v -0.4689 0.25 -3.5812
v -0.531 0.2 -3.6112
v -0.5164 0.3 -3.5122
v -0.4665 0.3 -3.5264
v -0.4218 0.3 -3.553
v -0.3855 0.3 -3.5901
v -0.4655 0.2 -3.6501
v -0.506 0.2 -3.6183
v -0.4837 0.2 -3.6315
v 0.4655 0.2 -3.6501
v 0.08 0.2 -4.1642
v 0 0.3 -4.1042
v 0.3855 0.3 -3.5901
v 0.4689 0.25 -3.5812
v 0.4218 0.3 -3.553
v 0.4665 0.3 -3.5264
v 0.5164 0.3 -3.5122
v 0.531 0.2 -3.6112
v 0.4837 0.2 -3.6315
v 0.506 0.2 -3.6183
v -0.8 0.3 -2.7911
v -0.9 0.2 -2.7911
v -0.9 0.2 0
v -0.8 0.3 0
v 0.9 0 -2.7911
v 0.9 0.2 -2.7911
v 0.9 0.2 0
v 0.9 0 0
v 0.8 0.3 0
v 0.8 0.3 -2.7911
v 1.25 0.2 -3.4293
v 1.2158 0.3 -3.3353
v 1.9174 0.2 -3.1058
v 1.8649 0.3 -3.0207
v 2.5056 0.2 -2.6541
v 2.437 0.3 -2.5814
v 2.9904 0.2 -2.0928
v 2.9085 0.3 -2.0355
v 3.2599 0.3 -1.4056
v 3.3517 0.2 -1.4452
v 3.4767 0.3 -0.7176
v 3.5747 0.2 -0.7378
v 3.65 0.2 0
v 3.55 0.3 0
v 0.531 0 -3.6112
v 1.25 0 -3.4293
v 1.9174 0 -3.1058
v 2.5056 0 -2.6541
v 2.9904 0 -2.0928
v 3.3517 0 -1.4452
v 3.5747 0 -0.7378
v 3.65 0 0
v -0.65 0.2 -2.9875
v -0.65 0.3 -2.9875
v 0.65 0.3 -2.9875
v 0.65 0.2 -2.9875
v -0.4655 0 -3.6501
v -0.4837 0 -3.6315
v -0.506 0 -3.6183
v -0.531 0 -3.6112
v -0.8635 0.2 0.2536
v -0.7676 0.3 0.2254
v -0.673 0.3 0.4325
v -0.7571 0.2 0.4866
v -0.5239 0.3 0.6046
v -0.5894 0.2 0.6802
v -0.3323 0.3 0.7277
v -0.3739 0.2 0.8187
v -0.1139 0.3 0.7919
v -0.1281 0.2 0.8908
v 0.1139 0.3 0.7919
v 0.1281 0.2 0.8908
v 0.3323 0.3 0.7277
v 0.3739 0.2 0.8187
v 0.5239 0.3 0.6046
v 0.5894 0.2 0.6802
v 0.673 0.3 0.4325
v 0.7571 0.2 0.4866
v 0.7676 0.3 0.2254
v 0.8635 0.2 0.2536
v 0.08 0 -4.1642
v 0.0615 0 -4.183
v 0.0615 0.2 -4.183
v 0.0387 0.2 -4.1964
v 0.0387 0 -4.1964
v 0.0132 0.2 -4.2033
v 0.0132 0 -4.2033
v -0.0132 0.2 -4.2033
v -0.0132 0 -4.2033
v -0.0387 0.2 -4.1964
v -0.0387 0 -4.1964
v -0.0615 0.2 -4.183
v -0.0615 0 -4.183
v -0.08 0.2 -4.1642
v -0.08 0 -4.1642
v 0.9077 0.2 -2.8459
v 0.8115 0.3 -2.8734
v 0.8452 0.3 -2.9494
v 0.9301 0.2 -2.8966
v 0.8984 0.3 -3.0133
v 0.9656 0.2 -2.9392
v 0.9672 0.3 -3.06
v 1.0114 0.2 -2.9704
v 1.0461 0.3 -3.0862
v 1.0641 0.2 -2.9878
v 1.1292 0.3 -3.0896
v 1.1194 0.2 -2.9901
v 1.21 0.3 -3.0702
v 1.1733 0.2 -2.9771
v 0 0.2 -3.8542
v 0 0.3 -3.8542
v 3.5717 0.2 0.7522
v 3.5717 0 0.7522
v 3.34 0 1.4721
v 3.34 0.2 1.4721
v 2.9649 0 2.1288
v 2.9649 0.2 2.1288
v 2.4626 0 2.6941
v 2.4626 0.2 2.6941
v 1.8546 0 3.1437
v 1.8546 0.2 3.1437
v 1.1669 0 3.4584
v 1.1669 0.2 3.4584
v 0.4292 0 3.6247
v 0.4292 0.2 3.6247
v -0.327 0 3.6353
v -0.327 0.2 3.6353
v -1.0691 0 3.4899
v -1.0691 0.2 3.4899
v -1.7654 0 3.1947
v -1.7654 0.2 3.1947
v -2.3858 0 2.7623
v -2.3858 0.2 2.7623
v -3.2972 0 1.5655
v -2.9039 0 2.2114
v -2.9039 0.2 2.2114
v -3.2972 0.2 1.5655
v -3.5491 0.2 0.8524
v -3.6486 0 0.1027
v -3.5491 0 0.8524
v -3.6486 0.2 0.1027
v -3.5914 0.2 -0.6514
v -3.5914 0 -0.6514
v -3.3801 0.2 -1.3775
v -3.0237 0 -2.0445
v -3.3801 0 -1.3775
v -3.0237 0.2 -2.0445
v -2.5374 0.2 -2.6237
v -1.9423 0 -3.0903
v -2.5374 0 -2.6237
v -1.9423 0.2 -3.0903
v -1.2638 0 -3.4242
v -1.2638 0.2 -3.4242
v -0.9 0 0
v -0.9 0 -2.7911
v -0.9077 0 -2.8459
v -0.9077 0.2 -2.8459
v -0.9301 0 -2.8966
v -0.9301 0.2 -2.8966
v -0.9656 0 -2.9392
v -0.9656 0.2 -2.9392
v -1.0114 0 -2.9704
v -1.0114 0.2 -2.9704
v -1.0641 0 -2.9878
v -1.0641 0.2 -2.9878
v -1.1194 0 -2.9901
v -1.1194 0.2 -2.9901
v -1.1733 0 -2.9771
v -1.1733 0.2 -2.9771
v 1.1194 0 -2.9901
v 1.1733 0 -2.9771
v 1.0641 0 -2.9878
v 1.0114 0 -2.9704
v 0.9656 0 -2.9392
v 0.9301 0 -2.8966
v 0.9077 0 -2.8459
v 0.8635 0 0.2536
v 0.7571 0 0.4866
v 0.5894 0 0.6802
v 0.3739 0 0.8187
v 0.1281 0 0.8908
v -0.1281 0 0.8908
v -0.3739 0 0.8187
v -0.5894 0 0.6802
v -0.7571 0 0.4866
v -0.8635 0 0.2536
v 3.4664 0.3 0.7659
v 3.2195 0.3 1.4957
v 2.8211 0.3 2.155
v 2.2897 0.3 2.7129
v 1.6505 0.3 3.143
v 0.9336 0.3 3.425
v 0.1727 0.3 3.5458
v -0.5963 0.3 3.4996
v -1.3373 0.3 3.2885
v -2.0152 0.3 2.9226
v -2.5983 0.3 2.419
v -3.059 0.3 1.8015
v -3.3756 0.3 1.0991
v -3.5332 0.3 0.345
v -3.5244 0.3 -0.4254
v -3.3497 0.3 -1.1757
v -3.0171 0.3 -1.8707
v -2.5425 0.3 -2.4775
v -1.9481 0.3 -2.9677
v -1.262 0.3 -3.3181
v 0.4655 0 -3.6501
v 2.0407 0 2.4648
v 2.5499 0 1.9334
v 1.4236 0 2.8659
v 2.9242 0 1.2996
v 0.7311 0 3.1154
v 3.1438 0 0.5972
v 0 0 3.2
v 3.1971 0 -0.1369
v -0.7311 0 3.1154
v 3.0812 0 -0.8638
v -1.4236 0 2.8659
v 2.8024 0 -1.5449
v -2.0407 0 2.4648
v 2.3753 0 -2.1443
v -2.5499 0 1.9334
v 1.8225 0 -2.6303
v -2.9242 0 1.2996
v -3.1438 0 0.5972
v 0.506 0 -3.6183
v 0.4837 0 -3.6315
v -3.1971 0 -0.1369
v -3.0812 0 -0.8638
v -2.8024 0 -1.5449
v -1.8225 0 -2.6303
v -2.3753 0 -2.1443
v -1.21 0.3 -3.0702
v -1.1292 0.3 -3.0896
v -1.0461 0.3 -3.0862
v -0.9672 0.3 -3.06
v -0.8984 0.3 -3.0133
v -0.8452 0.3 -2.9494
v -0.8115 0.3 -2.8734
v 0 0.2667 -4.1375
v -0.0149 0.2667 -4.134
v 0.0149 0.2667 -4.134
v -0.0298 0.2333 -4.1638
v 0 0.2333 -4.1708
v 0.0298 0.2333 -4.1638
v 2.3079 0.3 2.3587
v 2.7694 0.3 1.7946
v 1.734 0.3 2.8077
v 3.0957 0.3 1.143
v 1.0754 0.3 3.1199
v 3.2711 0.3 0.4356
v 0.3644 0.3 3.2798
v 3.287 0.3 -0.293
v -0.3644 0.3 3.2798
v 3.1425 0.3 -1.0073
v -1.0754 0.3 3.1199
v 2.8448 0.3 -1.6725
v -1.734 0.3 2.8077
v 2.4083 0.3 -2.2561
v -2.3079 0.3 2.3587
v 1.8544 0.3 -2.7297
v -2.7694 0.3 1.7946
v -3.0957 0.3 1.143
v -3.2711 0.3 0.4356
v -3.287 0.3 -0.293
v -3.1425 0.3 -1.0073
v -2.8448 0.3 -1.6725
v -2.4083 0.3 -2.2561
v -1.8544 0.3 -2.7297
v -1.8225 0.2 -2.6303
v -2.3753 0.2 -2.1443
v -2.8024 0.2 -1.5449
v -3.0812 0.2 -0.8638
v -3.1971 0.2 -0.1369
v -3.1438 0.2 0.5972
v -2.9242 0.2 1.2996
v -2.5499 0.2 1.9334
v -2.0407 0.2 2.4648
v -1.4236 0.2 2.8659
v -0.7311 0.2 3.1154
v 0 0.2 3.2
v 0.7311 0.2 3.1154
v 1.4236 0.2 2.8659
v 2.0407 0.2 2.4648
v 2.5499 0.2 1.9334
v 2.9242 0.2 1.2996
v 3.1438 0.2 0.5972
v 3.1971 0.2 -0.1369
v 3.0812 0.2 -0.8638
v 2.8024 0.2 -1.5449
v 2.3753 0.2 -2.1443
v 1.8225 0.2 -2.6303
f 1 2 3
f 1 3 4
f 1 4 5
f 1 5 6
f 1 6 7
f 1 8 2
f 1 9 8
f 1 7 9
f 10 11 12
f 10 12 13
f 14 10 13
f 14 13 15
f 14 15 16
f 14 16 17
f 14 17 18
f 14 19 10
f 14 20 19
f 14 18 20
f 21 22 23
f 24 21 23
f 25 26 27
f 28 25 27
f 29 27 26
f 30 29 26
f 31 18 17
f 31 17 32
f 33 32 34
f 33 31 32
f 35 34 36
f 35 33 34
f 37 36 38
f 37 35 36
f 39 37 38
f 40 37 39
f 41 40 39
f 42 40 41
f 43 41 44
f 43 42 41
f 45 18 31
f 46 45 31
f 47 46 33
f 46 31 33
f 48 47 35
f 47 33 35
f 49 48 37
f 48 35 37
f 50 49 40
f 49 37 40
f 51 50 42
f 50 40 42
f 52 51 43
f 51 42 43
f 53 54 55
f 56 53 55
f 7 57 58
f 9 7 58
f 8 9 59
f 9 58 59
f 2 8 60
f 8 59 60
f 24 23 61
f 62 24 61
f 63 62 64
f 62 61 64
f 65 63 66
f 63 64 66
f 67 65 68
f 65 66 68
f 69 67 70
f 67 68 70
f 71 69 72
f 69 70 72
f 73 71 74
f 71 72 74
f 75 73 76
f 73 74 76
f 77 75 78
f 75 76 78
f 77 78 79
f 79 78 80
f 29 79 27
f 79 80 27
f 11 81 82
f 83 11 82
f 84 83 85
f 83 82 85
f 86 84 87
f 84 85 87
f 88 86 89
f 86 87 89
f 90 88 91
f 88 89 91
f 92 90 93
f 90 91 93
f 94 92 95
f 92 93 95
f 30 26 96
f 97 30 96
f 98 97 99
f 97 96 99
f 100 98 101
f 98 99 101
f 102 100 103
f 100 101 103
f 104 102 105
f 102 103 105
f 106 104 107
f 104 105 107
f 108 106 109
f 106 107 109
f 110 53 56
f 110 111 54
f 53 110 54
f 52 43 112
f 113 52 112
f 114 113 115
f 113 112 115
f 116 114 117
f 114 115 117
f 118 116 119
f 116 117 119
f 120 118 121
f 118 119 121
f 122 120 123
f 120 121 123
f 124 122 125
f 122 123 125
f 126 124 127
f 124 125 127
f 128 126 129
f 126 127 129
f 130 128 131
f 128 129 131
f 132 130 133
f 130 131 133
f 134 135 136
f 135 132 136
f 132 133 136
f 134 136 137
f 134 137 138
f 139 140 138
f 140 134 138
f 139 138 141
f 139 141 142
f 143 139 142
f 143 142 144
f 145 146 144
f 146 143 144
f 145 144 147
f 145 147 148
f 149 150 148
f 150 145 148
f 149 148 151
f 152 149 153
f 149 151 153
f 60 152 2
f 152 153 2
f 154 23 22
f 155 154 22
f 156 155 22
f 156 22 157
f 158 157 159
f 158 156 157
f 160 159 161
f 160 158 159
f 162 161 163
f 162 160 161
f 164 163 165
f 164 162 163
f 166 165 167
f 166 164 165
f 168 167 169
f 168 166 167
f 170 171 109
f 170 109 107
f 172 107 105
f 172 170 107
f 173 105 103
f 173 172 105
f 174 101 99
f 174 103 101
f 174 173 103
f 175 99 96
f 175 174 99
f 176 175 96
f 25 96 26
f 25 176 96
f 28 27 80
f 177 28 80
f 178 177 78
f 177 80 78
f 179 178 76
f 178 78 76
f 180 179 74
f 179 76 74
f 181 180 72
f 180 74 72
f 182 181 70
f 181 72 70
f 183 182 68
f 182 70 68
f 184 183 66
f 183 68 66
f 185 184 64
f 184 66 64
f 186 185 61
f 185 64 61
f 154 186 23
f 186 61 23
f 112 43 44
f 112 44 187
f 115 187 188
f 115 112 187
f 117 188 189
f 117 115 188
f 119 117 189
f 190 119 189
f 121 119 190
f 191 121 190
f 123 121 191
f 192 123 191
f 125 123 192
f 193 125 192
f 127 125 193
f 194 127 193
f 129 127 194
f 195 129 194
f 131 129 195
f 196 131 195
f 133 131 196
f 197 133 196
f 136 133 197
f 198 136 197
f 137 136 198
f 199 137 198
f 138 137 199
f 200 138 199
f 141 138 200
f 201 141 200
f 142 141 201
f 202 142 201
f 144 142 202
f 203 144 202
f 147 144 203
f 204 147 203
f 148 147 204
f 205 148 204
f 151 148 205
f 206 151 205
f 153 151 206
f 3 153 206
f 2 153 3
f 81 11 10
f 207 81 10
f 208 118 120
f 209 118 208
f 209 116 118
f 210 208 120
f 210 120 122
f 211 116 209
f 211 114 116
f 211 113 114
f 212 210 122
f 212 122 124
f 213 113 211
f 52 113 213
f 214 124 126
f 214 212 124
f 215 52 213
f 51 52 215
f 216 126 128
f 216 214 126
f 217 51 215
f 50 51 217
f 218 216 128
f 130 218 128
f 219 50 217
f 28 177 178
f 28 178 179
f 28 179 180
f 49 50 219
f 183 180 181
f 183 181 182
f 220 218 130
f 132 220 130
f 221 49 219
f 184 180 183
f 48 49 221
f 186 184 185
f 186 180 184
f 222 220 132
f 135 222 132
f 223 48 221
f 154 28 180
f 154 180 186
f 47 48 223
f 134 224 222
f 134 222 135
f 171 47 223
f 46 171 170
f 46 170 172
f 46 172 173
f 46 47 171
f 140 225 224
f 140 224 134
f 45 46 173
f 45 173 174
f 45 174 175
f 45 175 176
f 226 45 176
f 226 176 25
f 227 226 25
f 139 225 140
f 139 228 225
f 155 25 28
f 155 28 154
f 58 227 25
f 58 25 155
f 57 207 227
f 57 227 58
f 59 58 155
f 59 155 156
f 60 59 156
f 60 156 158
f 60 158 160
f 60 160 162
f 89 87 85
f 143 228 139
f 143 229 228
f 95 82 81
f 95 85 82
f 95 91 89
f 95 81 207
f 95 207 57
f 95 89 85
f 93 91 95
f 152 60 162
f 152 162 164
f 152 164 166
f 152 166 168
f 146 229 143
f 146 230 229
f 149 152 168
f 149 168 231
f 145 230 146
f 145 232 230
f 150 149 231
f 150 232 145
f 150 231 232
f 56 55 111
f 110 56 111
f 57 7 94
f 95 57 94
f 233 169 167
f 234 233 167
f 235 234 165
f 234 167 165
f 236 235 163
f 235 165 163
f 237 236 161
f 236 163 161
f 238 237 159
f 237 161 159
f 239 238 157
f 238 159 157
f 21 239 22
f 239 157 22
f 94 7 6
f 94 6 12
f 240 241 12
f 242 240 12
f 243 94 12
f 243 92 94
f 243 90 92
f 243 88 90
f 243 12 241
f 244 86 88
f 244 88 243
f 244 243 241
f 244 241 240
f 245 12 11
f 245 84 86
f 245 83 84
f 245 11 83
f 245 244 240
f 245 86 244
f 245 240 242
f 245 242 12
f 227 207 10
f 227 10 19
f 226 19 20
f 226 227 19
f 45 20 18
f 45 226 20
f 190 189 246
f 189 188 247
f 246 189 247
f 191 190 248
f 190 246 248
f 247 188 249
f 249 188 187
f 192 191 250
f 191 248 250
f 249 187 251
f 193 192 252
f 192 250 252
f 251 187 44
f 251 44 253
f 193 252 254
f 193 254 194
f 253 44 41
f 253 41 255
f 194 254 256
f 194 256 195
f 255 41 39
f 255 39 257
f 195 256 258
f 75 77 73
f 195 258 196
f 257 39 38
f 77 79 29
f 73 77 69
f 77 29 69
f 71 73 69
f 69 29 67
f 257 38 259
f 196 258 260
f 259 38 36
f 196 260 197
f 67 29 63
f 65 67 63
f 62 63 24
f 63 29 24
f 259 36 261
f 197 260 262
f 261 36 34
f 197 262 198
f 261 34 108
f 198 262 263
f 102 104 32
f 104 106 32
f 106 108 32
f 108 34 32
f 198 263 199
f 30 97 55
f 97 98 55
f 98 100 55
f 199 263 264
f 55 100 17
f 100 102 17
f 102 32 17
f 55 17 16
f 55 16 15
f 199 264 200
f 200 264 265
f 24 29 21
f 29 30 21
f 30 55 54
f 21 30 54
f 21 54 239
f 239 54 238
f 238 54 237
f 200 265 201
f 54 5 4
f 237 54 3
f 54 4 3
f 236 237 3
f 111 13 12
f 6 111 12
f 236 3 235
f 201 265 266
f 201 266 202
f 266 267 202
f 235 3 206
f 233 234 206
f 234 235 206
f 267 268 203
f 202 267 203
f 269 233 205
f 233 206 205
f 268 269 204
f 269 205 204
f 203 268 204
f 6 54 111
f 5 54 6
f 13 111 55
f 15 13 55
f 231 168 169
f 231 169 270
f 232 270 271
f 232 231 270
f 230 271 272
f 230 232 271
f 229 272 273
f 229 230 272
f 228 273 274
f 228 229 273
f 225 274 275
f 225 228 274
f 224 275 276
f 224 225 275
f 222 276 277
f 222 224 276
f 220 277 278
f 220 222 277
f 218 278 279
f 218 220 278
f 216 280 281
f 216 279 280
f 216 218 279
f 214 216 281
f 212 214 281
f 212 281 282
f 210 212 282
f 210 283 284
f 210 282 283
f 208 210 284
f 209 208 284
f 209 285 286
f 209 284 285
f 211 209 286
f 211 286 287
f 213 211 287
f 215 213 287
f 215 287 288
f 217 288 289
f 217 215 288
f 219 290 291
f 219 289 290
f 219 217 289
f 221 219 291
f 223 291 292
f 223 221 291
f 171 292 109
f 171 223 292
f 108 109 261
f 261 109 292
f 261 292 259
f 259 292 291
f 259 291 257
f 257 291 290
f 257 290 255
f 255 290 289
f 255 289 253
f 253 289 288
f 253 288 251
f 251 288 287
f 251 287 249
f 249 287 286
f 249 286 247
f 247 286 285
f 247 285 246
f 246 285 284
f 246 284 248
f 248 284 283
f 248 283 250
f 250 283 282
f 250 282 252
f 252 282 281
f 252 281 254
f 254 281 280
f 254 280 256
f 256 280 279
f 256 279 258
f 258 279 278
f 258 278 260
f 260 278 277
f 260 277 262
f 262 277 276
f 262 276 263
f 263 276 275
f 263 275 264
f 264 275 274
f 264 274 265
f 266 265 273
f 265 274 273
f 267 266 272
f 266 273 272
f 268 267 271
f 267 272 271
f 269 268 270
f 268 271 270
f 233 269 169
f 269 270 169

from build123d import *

# Parameters (mm, degrees)
SKETCH2_R             = 0.786234884
BOSS_EXTRUDE1_DEPTH   = 0.3
SKETCH2_R_2           = 5.5
SKETCH2_R_3           = 3.2
BOSS_EXTRUDE1_2_DEPTH = 0.3
BOSS_EXTRUDE2_DEPTH   = 0.3
SKETCH4_R             = 5.5
CUT_EXTRUDE1_DEPTH    = 1.3
FILLET1_R             = 0.2
FILLET2_R             = 0.1
CHAMFER1_SIZE         = 0.1
CUT_EXTRUDE2_DEPTH    = 0.1


with BuildPart() as part:
    # Sketch2 → Boss-Extrude1 (new body)
    with BuildSketch(Plane(origin=(0, 0, 0), x_dir=(1, 0, 0), z_dir=(0, 1, 0))):
        Circle(SKETCH2_R)
    extrude(amount=BOSS_EXTRUDE1_DEPTH)



with BuildPart() as body_2:
    # Sketch2 → Boss-Extrude1 2 (new body)
    with BuildSketch(Plane(origin=(0, 0, 0), x_dir=(1, 0, 0), z_dir=(0, 1, 0))):
        Circle(SKETCH2_R_2)
        Circle(SKETCH2_R_3, mode=Mode.SUBTRACT)
    extrude(amount=BOSS_EXTRUDE1_2_DEPTH)


with BuildPart() as part_1:
    add(part.part)

    add(body_2.part)  # Boss-Extrude2 merges body 2
    # Sketch3 → Boss-Extrude2 (add)
    with BuildSketch(Plane(origin=(0, 0.3, 0), x_dir=(1, 0, 0), z_dir=(0, 1, 0))):
        with BuildLine():
            Line((-0.9, 0), (-0.9, 3.441526045))
            Line((-0.9, 3.441526045), (0.9, 3.441526045))
            Line((0.9, 3.441526045), (0.9, 0))
            ThreePointArc((0.9, 0), (0, -0.9), (-0.9, 0))
        make_face()
    extrude(amount=-BOSS_EXTRUDE2_DEPTH)

    # Sketch4 → Cut-Extrude1 (cut, through all)
    with BuildSketch(Plane(origin=(0, 0.3, 0), x_dir=(1, 0, 0), z_dir=(0, 1, 0))):
        Circle(SKETCH4_R)
        with BuildLine():
            ThreePointArc((3.65, 0), (-2.401287493, -2.748875839), (-0.490448426, 3.616899272))
            Line((-0.490448426, 3.616899272), (0, 4.270830507))
            Line((0, 4.270830507), (0.490448426, 3.616899272))
            ThreePointArc((0.490448426, 3.616899272), (2.748875839, 2.401287493), (3.65, 0))
        make_face(mode=Mode.SUBTRACT)
    extrude(amount=-CUT_EXTRUDE1_DEPTH, mode=Mode.SUBTRACT)

    # Fillet1
    fillet1_edges = [part_1.edges().sort_by_distance(p)[0] for p in [
        (-0.9, 0.15, -3.070830507),
        (0.9, 0.15, -3.070830507),
    ]]
    fillet(fillet1_edges, radius=FILLET1_R)

    # Fillet2
    fillet2_edges = [part_1.edges().sort_by_distance(p)[0] for p in [
        (0.490448426, 0.15, -3.616899272),
        (0, 0.15, -4.270830507),
        (-0.490448426, 0.15, -3.616899272),
    ]]
    fillet(fillet2_edges, radius=FILLET2_R)

    # Chamfer1
    chamfer1_edges = [part_1.edges().sort_by_distance(p)[0] for p in [
        (0, 0.3, 3.2),
        (-0.9, 0.3, -1.395528574),
        (0.987453713, 0.3, -2.956385104),
        (-0.987453713, 0.3, -2.956385104),
        (0, 0.3, 0.9),
        (0, 0.3, 3.65),
        (0.9, 0.3, -1.395528574),
        (0.272771923, 0.3, -3.907134609),
        (-0.272771923, 0.3, -3.907134609),
        (0, 0.3, -4.20416384),
        (0.494418226, 0.3, -3.624162542),
        (-0.494418226, 0.3, -3.624162542),
    ]]
    chamfer(chamfer1_edges, length=CHAMFER1_SIZE)

    # Sketch5 → Cut-Extrude2 (cut)
    with BuildSketch(Plane(origin=(0, 0.3, 0), x_dir=(1, 0, 0), z_dir=(0, 1, 0))):
        Polygon((-0.65, 2.987497173), (0.65, 2.987497173), (0, 3.85416384), align=None)
    extrude(amount=-CUT_EXTRUDE2_DEPTH, mode=Mode.SUBTRACT)


solid = part_1.part
